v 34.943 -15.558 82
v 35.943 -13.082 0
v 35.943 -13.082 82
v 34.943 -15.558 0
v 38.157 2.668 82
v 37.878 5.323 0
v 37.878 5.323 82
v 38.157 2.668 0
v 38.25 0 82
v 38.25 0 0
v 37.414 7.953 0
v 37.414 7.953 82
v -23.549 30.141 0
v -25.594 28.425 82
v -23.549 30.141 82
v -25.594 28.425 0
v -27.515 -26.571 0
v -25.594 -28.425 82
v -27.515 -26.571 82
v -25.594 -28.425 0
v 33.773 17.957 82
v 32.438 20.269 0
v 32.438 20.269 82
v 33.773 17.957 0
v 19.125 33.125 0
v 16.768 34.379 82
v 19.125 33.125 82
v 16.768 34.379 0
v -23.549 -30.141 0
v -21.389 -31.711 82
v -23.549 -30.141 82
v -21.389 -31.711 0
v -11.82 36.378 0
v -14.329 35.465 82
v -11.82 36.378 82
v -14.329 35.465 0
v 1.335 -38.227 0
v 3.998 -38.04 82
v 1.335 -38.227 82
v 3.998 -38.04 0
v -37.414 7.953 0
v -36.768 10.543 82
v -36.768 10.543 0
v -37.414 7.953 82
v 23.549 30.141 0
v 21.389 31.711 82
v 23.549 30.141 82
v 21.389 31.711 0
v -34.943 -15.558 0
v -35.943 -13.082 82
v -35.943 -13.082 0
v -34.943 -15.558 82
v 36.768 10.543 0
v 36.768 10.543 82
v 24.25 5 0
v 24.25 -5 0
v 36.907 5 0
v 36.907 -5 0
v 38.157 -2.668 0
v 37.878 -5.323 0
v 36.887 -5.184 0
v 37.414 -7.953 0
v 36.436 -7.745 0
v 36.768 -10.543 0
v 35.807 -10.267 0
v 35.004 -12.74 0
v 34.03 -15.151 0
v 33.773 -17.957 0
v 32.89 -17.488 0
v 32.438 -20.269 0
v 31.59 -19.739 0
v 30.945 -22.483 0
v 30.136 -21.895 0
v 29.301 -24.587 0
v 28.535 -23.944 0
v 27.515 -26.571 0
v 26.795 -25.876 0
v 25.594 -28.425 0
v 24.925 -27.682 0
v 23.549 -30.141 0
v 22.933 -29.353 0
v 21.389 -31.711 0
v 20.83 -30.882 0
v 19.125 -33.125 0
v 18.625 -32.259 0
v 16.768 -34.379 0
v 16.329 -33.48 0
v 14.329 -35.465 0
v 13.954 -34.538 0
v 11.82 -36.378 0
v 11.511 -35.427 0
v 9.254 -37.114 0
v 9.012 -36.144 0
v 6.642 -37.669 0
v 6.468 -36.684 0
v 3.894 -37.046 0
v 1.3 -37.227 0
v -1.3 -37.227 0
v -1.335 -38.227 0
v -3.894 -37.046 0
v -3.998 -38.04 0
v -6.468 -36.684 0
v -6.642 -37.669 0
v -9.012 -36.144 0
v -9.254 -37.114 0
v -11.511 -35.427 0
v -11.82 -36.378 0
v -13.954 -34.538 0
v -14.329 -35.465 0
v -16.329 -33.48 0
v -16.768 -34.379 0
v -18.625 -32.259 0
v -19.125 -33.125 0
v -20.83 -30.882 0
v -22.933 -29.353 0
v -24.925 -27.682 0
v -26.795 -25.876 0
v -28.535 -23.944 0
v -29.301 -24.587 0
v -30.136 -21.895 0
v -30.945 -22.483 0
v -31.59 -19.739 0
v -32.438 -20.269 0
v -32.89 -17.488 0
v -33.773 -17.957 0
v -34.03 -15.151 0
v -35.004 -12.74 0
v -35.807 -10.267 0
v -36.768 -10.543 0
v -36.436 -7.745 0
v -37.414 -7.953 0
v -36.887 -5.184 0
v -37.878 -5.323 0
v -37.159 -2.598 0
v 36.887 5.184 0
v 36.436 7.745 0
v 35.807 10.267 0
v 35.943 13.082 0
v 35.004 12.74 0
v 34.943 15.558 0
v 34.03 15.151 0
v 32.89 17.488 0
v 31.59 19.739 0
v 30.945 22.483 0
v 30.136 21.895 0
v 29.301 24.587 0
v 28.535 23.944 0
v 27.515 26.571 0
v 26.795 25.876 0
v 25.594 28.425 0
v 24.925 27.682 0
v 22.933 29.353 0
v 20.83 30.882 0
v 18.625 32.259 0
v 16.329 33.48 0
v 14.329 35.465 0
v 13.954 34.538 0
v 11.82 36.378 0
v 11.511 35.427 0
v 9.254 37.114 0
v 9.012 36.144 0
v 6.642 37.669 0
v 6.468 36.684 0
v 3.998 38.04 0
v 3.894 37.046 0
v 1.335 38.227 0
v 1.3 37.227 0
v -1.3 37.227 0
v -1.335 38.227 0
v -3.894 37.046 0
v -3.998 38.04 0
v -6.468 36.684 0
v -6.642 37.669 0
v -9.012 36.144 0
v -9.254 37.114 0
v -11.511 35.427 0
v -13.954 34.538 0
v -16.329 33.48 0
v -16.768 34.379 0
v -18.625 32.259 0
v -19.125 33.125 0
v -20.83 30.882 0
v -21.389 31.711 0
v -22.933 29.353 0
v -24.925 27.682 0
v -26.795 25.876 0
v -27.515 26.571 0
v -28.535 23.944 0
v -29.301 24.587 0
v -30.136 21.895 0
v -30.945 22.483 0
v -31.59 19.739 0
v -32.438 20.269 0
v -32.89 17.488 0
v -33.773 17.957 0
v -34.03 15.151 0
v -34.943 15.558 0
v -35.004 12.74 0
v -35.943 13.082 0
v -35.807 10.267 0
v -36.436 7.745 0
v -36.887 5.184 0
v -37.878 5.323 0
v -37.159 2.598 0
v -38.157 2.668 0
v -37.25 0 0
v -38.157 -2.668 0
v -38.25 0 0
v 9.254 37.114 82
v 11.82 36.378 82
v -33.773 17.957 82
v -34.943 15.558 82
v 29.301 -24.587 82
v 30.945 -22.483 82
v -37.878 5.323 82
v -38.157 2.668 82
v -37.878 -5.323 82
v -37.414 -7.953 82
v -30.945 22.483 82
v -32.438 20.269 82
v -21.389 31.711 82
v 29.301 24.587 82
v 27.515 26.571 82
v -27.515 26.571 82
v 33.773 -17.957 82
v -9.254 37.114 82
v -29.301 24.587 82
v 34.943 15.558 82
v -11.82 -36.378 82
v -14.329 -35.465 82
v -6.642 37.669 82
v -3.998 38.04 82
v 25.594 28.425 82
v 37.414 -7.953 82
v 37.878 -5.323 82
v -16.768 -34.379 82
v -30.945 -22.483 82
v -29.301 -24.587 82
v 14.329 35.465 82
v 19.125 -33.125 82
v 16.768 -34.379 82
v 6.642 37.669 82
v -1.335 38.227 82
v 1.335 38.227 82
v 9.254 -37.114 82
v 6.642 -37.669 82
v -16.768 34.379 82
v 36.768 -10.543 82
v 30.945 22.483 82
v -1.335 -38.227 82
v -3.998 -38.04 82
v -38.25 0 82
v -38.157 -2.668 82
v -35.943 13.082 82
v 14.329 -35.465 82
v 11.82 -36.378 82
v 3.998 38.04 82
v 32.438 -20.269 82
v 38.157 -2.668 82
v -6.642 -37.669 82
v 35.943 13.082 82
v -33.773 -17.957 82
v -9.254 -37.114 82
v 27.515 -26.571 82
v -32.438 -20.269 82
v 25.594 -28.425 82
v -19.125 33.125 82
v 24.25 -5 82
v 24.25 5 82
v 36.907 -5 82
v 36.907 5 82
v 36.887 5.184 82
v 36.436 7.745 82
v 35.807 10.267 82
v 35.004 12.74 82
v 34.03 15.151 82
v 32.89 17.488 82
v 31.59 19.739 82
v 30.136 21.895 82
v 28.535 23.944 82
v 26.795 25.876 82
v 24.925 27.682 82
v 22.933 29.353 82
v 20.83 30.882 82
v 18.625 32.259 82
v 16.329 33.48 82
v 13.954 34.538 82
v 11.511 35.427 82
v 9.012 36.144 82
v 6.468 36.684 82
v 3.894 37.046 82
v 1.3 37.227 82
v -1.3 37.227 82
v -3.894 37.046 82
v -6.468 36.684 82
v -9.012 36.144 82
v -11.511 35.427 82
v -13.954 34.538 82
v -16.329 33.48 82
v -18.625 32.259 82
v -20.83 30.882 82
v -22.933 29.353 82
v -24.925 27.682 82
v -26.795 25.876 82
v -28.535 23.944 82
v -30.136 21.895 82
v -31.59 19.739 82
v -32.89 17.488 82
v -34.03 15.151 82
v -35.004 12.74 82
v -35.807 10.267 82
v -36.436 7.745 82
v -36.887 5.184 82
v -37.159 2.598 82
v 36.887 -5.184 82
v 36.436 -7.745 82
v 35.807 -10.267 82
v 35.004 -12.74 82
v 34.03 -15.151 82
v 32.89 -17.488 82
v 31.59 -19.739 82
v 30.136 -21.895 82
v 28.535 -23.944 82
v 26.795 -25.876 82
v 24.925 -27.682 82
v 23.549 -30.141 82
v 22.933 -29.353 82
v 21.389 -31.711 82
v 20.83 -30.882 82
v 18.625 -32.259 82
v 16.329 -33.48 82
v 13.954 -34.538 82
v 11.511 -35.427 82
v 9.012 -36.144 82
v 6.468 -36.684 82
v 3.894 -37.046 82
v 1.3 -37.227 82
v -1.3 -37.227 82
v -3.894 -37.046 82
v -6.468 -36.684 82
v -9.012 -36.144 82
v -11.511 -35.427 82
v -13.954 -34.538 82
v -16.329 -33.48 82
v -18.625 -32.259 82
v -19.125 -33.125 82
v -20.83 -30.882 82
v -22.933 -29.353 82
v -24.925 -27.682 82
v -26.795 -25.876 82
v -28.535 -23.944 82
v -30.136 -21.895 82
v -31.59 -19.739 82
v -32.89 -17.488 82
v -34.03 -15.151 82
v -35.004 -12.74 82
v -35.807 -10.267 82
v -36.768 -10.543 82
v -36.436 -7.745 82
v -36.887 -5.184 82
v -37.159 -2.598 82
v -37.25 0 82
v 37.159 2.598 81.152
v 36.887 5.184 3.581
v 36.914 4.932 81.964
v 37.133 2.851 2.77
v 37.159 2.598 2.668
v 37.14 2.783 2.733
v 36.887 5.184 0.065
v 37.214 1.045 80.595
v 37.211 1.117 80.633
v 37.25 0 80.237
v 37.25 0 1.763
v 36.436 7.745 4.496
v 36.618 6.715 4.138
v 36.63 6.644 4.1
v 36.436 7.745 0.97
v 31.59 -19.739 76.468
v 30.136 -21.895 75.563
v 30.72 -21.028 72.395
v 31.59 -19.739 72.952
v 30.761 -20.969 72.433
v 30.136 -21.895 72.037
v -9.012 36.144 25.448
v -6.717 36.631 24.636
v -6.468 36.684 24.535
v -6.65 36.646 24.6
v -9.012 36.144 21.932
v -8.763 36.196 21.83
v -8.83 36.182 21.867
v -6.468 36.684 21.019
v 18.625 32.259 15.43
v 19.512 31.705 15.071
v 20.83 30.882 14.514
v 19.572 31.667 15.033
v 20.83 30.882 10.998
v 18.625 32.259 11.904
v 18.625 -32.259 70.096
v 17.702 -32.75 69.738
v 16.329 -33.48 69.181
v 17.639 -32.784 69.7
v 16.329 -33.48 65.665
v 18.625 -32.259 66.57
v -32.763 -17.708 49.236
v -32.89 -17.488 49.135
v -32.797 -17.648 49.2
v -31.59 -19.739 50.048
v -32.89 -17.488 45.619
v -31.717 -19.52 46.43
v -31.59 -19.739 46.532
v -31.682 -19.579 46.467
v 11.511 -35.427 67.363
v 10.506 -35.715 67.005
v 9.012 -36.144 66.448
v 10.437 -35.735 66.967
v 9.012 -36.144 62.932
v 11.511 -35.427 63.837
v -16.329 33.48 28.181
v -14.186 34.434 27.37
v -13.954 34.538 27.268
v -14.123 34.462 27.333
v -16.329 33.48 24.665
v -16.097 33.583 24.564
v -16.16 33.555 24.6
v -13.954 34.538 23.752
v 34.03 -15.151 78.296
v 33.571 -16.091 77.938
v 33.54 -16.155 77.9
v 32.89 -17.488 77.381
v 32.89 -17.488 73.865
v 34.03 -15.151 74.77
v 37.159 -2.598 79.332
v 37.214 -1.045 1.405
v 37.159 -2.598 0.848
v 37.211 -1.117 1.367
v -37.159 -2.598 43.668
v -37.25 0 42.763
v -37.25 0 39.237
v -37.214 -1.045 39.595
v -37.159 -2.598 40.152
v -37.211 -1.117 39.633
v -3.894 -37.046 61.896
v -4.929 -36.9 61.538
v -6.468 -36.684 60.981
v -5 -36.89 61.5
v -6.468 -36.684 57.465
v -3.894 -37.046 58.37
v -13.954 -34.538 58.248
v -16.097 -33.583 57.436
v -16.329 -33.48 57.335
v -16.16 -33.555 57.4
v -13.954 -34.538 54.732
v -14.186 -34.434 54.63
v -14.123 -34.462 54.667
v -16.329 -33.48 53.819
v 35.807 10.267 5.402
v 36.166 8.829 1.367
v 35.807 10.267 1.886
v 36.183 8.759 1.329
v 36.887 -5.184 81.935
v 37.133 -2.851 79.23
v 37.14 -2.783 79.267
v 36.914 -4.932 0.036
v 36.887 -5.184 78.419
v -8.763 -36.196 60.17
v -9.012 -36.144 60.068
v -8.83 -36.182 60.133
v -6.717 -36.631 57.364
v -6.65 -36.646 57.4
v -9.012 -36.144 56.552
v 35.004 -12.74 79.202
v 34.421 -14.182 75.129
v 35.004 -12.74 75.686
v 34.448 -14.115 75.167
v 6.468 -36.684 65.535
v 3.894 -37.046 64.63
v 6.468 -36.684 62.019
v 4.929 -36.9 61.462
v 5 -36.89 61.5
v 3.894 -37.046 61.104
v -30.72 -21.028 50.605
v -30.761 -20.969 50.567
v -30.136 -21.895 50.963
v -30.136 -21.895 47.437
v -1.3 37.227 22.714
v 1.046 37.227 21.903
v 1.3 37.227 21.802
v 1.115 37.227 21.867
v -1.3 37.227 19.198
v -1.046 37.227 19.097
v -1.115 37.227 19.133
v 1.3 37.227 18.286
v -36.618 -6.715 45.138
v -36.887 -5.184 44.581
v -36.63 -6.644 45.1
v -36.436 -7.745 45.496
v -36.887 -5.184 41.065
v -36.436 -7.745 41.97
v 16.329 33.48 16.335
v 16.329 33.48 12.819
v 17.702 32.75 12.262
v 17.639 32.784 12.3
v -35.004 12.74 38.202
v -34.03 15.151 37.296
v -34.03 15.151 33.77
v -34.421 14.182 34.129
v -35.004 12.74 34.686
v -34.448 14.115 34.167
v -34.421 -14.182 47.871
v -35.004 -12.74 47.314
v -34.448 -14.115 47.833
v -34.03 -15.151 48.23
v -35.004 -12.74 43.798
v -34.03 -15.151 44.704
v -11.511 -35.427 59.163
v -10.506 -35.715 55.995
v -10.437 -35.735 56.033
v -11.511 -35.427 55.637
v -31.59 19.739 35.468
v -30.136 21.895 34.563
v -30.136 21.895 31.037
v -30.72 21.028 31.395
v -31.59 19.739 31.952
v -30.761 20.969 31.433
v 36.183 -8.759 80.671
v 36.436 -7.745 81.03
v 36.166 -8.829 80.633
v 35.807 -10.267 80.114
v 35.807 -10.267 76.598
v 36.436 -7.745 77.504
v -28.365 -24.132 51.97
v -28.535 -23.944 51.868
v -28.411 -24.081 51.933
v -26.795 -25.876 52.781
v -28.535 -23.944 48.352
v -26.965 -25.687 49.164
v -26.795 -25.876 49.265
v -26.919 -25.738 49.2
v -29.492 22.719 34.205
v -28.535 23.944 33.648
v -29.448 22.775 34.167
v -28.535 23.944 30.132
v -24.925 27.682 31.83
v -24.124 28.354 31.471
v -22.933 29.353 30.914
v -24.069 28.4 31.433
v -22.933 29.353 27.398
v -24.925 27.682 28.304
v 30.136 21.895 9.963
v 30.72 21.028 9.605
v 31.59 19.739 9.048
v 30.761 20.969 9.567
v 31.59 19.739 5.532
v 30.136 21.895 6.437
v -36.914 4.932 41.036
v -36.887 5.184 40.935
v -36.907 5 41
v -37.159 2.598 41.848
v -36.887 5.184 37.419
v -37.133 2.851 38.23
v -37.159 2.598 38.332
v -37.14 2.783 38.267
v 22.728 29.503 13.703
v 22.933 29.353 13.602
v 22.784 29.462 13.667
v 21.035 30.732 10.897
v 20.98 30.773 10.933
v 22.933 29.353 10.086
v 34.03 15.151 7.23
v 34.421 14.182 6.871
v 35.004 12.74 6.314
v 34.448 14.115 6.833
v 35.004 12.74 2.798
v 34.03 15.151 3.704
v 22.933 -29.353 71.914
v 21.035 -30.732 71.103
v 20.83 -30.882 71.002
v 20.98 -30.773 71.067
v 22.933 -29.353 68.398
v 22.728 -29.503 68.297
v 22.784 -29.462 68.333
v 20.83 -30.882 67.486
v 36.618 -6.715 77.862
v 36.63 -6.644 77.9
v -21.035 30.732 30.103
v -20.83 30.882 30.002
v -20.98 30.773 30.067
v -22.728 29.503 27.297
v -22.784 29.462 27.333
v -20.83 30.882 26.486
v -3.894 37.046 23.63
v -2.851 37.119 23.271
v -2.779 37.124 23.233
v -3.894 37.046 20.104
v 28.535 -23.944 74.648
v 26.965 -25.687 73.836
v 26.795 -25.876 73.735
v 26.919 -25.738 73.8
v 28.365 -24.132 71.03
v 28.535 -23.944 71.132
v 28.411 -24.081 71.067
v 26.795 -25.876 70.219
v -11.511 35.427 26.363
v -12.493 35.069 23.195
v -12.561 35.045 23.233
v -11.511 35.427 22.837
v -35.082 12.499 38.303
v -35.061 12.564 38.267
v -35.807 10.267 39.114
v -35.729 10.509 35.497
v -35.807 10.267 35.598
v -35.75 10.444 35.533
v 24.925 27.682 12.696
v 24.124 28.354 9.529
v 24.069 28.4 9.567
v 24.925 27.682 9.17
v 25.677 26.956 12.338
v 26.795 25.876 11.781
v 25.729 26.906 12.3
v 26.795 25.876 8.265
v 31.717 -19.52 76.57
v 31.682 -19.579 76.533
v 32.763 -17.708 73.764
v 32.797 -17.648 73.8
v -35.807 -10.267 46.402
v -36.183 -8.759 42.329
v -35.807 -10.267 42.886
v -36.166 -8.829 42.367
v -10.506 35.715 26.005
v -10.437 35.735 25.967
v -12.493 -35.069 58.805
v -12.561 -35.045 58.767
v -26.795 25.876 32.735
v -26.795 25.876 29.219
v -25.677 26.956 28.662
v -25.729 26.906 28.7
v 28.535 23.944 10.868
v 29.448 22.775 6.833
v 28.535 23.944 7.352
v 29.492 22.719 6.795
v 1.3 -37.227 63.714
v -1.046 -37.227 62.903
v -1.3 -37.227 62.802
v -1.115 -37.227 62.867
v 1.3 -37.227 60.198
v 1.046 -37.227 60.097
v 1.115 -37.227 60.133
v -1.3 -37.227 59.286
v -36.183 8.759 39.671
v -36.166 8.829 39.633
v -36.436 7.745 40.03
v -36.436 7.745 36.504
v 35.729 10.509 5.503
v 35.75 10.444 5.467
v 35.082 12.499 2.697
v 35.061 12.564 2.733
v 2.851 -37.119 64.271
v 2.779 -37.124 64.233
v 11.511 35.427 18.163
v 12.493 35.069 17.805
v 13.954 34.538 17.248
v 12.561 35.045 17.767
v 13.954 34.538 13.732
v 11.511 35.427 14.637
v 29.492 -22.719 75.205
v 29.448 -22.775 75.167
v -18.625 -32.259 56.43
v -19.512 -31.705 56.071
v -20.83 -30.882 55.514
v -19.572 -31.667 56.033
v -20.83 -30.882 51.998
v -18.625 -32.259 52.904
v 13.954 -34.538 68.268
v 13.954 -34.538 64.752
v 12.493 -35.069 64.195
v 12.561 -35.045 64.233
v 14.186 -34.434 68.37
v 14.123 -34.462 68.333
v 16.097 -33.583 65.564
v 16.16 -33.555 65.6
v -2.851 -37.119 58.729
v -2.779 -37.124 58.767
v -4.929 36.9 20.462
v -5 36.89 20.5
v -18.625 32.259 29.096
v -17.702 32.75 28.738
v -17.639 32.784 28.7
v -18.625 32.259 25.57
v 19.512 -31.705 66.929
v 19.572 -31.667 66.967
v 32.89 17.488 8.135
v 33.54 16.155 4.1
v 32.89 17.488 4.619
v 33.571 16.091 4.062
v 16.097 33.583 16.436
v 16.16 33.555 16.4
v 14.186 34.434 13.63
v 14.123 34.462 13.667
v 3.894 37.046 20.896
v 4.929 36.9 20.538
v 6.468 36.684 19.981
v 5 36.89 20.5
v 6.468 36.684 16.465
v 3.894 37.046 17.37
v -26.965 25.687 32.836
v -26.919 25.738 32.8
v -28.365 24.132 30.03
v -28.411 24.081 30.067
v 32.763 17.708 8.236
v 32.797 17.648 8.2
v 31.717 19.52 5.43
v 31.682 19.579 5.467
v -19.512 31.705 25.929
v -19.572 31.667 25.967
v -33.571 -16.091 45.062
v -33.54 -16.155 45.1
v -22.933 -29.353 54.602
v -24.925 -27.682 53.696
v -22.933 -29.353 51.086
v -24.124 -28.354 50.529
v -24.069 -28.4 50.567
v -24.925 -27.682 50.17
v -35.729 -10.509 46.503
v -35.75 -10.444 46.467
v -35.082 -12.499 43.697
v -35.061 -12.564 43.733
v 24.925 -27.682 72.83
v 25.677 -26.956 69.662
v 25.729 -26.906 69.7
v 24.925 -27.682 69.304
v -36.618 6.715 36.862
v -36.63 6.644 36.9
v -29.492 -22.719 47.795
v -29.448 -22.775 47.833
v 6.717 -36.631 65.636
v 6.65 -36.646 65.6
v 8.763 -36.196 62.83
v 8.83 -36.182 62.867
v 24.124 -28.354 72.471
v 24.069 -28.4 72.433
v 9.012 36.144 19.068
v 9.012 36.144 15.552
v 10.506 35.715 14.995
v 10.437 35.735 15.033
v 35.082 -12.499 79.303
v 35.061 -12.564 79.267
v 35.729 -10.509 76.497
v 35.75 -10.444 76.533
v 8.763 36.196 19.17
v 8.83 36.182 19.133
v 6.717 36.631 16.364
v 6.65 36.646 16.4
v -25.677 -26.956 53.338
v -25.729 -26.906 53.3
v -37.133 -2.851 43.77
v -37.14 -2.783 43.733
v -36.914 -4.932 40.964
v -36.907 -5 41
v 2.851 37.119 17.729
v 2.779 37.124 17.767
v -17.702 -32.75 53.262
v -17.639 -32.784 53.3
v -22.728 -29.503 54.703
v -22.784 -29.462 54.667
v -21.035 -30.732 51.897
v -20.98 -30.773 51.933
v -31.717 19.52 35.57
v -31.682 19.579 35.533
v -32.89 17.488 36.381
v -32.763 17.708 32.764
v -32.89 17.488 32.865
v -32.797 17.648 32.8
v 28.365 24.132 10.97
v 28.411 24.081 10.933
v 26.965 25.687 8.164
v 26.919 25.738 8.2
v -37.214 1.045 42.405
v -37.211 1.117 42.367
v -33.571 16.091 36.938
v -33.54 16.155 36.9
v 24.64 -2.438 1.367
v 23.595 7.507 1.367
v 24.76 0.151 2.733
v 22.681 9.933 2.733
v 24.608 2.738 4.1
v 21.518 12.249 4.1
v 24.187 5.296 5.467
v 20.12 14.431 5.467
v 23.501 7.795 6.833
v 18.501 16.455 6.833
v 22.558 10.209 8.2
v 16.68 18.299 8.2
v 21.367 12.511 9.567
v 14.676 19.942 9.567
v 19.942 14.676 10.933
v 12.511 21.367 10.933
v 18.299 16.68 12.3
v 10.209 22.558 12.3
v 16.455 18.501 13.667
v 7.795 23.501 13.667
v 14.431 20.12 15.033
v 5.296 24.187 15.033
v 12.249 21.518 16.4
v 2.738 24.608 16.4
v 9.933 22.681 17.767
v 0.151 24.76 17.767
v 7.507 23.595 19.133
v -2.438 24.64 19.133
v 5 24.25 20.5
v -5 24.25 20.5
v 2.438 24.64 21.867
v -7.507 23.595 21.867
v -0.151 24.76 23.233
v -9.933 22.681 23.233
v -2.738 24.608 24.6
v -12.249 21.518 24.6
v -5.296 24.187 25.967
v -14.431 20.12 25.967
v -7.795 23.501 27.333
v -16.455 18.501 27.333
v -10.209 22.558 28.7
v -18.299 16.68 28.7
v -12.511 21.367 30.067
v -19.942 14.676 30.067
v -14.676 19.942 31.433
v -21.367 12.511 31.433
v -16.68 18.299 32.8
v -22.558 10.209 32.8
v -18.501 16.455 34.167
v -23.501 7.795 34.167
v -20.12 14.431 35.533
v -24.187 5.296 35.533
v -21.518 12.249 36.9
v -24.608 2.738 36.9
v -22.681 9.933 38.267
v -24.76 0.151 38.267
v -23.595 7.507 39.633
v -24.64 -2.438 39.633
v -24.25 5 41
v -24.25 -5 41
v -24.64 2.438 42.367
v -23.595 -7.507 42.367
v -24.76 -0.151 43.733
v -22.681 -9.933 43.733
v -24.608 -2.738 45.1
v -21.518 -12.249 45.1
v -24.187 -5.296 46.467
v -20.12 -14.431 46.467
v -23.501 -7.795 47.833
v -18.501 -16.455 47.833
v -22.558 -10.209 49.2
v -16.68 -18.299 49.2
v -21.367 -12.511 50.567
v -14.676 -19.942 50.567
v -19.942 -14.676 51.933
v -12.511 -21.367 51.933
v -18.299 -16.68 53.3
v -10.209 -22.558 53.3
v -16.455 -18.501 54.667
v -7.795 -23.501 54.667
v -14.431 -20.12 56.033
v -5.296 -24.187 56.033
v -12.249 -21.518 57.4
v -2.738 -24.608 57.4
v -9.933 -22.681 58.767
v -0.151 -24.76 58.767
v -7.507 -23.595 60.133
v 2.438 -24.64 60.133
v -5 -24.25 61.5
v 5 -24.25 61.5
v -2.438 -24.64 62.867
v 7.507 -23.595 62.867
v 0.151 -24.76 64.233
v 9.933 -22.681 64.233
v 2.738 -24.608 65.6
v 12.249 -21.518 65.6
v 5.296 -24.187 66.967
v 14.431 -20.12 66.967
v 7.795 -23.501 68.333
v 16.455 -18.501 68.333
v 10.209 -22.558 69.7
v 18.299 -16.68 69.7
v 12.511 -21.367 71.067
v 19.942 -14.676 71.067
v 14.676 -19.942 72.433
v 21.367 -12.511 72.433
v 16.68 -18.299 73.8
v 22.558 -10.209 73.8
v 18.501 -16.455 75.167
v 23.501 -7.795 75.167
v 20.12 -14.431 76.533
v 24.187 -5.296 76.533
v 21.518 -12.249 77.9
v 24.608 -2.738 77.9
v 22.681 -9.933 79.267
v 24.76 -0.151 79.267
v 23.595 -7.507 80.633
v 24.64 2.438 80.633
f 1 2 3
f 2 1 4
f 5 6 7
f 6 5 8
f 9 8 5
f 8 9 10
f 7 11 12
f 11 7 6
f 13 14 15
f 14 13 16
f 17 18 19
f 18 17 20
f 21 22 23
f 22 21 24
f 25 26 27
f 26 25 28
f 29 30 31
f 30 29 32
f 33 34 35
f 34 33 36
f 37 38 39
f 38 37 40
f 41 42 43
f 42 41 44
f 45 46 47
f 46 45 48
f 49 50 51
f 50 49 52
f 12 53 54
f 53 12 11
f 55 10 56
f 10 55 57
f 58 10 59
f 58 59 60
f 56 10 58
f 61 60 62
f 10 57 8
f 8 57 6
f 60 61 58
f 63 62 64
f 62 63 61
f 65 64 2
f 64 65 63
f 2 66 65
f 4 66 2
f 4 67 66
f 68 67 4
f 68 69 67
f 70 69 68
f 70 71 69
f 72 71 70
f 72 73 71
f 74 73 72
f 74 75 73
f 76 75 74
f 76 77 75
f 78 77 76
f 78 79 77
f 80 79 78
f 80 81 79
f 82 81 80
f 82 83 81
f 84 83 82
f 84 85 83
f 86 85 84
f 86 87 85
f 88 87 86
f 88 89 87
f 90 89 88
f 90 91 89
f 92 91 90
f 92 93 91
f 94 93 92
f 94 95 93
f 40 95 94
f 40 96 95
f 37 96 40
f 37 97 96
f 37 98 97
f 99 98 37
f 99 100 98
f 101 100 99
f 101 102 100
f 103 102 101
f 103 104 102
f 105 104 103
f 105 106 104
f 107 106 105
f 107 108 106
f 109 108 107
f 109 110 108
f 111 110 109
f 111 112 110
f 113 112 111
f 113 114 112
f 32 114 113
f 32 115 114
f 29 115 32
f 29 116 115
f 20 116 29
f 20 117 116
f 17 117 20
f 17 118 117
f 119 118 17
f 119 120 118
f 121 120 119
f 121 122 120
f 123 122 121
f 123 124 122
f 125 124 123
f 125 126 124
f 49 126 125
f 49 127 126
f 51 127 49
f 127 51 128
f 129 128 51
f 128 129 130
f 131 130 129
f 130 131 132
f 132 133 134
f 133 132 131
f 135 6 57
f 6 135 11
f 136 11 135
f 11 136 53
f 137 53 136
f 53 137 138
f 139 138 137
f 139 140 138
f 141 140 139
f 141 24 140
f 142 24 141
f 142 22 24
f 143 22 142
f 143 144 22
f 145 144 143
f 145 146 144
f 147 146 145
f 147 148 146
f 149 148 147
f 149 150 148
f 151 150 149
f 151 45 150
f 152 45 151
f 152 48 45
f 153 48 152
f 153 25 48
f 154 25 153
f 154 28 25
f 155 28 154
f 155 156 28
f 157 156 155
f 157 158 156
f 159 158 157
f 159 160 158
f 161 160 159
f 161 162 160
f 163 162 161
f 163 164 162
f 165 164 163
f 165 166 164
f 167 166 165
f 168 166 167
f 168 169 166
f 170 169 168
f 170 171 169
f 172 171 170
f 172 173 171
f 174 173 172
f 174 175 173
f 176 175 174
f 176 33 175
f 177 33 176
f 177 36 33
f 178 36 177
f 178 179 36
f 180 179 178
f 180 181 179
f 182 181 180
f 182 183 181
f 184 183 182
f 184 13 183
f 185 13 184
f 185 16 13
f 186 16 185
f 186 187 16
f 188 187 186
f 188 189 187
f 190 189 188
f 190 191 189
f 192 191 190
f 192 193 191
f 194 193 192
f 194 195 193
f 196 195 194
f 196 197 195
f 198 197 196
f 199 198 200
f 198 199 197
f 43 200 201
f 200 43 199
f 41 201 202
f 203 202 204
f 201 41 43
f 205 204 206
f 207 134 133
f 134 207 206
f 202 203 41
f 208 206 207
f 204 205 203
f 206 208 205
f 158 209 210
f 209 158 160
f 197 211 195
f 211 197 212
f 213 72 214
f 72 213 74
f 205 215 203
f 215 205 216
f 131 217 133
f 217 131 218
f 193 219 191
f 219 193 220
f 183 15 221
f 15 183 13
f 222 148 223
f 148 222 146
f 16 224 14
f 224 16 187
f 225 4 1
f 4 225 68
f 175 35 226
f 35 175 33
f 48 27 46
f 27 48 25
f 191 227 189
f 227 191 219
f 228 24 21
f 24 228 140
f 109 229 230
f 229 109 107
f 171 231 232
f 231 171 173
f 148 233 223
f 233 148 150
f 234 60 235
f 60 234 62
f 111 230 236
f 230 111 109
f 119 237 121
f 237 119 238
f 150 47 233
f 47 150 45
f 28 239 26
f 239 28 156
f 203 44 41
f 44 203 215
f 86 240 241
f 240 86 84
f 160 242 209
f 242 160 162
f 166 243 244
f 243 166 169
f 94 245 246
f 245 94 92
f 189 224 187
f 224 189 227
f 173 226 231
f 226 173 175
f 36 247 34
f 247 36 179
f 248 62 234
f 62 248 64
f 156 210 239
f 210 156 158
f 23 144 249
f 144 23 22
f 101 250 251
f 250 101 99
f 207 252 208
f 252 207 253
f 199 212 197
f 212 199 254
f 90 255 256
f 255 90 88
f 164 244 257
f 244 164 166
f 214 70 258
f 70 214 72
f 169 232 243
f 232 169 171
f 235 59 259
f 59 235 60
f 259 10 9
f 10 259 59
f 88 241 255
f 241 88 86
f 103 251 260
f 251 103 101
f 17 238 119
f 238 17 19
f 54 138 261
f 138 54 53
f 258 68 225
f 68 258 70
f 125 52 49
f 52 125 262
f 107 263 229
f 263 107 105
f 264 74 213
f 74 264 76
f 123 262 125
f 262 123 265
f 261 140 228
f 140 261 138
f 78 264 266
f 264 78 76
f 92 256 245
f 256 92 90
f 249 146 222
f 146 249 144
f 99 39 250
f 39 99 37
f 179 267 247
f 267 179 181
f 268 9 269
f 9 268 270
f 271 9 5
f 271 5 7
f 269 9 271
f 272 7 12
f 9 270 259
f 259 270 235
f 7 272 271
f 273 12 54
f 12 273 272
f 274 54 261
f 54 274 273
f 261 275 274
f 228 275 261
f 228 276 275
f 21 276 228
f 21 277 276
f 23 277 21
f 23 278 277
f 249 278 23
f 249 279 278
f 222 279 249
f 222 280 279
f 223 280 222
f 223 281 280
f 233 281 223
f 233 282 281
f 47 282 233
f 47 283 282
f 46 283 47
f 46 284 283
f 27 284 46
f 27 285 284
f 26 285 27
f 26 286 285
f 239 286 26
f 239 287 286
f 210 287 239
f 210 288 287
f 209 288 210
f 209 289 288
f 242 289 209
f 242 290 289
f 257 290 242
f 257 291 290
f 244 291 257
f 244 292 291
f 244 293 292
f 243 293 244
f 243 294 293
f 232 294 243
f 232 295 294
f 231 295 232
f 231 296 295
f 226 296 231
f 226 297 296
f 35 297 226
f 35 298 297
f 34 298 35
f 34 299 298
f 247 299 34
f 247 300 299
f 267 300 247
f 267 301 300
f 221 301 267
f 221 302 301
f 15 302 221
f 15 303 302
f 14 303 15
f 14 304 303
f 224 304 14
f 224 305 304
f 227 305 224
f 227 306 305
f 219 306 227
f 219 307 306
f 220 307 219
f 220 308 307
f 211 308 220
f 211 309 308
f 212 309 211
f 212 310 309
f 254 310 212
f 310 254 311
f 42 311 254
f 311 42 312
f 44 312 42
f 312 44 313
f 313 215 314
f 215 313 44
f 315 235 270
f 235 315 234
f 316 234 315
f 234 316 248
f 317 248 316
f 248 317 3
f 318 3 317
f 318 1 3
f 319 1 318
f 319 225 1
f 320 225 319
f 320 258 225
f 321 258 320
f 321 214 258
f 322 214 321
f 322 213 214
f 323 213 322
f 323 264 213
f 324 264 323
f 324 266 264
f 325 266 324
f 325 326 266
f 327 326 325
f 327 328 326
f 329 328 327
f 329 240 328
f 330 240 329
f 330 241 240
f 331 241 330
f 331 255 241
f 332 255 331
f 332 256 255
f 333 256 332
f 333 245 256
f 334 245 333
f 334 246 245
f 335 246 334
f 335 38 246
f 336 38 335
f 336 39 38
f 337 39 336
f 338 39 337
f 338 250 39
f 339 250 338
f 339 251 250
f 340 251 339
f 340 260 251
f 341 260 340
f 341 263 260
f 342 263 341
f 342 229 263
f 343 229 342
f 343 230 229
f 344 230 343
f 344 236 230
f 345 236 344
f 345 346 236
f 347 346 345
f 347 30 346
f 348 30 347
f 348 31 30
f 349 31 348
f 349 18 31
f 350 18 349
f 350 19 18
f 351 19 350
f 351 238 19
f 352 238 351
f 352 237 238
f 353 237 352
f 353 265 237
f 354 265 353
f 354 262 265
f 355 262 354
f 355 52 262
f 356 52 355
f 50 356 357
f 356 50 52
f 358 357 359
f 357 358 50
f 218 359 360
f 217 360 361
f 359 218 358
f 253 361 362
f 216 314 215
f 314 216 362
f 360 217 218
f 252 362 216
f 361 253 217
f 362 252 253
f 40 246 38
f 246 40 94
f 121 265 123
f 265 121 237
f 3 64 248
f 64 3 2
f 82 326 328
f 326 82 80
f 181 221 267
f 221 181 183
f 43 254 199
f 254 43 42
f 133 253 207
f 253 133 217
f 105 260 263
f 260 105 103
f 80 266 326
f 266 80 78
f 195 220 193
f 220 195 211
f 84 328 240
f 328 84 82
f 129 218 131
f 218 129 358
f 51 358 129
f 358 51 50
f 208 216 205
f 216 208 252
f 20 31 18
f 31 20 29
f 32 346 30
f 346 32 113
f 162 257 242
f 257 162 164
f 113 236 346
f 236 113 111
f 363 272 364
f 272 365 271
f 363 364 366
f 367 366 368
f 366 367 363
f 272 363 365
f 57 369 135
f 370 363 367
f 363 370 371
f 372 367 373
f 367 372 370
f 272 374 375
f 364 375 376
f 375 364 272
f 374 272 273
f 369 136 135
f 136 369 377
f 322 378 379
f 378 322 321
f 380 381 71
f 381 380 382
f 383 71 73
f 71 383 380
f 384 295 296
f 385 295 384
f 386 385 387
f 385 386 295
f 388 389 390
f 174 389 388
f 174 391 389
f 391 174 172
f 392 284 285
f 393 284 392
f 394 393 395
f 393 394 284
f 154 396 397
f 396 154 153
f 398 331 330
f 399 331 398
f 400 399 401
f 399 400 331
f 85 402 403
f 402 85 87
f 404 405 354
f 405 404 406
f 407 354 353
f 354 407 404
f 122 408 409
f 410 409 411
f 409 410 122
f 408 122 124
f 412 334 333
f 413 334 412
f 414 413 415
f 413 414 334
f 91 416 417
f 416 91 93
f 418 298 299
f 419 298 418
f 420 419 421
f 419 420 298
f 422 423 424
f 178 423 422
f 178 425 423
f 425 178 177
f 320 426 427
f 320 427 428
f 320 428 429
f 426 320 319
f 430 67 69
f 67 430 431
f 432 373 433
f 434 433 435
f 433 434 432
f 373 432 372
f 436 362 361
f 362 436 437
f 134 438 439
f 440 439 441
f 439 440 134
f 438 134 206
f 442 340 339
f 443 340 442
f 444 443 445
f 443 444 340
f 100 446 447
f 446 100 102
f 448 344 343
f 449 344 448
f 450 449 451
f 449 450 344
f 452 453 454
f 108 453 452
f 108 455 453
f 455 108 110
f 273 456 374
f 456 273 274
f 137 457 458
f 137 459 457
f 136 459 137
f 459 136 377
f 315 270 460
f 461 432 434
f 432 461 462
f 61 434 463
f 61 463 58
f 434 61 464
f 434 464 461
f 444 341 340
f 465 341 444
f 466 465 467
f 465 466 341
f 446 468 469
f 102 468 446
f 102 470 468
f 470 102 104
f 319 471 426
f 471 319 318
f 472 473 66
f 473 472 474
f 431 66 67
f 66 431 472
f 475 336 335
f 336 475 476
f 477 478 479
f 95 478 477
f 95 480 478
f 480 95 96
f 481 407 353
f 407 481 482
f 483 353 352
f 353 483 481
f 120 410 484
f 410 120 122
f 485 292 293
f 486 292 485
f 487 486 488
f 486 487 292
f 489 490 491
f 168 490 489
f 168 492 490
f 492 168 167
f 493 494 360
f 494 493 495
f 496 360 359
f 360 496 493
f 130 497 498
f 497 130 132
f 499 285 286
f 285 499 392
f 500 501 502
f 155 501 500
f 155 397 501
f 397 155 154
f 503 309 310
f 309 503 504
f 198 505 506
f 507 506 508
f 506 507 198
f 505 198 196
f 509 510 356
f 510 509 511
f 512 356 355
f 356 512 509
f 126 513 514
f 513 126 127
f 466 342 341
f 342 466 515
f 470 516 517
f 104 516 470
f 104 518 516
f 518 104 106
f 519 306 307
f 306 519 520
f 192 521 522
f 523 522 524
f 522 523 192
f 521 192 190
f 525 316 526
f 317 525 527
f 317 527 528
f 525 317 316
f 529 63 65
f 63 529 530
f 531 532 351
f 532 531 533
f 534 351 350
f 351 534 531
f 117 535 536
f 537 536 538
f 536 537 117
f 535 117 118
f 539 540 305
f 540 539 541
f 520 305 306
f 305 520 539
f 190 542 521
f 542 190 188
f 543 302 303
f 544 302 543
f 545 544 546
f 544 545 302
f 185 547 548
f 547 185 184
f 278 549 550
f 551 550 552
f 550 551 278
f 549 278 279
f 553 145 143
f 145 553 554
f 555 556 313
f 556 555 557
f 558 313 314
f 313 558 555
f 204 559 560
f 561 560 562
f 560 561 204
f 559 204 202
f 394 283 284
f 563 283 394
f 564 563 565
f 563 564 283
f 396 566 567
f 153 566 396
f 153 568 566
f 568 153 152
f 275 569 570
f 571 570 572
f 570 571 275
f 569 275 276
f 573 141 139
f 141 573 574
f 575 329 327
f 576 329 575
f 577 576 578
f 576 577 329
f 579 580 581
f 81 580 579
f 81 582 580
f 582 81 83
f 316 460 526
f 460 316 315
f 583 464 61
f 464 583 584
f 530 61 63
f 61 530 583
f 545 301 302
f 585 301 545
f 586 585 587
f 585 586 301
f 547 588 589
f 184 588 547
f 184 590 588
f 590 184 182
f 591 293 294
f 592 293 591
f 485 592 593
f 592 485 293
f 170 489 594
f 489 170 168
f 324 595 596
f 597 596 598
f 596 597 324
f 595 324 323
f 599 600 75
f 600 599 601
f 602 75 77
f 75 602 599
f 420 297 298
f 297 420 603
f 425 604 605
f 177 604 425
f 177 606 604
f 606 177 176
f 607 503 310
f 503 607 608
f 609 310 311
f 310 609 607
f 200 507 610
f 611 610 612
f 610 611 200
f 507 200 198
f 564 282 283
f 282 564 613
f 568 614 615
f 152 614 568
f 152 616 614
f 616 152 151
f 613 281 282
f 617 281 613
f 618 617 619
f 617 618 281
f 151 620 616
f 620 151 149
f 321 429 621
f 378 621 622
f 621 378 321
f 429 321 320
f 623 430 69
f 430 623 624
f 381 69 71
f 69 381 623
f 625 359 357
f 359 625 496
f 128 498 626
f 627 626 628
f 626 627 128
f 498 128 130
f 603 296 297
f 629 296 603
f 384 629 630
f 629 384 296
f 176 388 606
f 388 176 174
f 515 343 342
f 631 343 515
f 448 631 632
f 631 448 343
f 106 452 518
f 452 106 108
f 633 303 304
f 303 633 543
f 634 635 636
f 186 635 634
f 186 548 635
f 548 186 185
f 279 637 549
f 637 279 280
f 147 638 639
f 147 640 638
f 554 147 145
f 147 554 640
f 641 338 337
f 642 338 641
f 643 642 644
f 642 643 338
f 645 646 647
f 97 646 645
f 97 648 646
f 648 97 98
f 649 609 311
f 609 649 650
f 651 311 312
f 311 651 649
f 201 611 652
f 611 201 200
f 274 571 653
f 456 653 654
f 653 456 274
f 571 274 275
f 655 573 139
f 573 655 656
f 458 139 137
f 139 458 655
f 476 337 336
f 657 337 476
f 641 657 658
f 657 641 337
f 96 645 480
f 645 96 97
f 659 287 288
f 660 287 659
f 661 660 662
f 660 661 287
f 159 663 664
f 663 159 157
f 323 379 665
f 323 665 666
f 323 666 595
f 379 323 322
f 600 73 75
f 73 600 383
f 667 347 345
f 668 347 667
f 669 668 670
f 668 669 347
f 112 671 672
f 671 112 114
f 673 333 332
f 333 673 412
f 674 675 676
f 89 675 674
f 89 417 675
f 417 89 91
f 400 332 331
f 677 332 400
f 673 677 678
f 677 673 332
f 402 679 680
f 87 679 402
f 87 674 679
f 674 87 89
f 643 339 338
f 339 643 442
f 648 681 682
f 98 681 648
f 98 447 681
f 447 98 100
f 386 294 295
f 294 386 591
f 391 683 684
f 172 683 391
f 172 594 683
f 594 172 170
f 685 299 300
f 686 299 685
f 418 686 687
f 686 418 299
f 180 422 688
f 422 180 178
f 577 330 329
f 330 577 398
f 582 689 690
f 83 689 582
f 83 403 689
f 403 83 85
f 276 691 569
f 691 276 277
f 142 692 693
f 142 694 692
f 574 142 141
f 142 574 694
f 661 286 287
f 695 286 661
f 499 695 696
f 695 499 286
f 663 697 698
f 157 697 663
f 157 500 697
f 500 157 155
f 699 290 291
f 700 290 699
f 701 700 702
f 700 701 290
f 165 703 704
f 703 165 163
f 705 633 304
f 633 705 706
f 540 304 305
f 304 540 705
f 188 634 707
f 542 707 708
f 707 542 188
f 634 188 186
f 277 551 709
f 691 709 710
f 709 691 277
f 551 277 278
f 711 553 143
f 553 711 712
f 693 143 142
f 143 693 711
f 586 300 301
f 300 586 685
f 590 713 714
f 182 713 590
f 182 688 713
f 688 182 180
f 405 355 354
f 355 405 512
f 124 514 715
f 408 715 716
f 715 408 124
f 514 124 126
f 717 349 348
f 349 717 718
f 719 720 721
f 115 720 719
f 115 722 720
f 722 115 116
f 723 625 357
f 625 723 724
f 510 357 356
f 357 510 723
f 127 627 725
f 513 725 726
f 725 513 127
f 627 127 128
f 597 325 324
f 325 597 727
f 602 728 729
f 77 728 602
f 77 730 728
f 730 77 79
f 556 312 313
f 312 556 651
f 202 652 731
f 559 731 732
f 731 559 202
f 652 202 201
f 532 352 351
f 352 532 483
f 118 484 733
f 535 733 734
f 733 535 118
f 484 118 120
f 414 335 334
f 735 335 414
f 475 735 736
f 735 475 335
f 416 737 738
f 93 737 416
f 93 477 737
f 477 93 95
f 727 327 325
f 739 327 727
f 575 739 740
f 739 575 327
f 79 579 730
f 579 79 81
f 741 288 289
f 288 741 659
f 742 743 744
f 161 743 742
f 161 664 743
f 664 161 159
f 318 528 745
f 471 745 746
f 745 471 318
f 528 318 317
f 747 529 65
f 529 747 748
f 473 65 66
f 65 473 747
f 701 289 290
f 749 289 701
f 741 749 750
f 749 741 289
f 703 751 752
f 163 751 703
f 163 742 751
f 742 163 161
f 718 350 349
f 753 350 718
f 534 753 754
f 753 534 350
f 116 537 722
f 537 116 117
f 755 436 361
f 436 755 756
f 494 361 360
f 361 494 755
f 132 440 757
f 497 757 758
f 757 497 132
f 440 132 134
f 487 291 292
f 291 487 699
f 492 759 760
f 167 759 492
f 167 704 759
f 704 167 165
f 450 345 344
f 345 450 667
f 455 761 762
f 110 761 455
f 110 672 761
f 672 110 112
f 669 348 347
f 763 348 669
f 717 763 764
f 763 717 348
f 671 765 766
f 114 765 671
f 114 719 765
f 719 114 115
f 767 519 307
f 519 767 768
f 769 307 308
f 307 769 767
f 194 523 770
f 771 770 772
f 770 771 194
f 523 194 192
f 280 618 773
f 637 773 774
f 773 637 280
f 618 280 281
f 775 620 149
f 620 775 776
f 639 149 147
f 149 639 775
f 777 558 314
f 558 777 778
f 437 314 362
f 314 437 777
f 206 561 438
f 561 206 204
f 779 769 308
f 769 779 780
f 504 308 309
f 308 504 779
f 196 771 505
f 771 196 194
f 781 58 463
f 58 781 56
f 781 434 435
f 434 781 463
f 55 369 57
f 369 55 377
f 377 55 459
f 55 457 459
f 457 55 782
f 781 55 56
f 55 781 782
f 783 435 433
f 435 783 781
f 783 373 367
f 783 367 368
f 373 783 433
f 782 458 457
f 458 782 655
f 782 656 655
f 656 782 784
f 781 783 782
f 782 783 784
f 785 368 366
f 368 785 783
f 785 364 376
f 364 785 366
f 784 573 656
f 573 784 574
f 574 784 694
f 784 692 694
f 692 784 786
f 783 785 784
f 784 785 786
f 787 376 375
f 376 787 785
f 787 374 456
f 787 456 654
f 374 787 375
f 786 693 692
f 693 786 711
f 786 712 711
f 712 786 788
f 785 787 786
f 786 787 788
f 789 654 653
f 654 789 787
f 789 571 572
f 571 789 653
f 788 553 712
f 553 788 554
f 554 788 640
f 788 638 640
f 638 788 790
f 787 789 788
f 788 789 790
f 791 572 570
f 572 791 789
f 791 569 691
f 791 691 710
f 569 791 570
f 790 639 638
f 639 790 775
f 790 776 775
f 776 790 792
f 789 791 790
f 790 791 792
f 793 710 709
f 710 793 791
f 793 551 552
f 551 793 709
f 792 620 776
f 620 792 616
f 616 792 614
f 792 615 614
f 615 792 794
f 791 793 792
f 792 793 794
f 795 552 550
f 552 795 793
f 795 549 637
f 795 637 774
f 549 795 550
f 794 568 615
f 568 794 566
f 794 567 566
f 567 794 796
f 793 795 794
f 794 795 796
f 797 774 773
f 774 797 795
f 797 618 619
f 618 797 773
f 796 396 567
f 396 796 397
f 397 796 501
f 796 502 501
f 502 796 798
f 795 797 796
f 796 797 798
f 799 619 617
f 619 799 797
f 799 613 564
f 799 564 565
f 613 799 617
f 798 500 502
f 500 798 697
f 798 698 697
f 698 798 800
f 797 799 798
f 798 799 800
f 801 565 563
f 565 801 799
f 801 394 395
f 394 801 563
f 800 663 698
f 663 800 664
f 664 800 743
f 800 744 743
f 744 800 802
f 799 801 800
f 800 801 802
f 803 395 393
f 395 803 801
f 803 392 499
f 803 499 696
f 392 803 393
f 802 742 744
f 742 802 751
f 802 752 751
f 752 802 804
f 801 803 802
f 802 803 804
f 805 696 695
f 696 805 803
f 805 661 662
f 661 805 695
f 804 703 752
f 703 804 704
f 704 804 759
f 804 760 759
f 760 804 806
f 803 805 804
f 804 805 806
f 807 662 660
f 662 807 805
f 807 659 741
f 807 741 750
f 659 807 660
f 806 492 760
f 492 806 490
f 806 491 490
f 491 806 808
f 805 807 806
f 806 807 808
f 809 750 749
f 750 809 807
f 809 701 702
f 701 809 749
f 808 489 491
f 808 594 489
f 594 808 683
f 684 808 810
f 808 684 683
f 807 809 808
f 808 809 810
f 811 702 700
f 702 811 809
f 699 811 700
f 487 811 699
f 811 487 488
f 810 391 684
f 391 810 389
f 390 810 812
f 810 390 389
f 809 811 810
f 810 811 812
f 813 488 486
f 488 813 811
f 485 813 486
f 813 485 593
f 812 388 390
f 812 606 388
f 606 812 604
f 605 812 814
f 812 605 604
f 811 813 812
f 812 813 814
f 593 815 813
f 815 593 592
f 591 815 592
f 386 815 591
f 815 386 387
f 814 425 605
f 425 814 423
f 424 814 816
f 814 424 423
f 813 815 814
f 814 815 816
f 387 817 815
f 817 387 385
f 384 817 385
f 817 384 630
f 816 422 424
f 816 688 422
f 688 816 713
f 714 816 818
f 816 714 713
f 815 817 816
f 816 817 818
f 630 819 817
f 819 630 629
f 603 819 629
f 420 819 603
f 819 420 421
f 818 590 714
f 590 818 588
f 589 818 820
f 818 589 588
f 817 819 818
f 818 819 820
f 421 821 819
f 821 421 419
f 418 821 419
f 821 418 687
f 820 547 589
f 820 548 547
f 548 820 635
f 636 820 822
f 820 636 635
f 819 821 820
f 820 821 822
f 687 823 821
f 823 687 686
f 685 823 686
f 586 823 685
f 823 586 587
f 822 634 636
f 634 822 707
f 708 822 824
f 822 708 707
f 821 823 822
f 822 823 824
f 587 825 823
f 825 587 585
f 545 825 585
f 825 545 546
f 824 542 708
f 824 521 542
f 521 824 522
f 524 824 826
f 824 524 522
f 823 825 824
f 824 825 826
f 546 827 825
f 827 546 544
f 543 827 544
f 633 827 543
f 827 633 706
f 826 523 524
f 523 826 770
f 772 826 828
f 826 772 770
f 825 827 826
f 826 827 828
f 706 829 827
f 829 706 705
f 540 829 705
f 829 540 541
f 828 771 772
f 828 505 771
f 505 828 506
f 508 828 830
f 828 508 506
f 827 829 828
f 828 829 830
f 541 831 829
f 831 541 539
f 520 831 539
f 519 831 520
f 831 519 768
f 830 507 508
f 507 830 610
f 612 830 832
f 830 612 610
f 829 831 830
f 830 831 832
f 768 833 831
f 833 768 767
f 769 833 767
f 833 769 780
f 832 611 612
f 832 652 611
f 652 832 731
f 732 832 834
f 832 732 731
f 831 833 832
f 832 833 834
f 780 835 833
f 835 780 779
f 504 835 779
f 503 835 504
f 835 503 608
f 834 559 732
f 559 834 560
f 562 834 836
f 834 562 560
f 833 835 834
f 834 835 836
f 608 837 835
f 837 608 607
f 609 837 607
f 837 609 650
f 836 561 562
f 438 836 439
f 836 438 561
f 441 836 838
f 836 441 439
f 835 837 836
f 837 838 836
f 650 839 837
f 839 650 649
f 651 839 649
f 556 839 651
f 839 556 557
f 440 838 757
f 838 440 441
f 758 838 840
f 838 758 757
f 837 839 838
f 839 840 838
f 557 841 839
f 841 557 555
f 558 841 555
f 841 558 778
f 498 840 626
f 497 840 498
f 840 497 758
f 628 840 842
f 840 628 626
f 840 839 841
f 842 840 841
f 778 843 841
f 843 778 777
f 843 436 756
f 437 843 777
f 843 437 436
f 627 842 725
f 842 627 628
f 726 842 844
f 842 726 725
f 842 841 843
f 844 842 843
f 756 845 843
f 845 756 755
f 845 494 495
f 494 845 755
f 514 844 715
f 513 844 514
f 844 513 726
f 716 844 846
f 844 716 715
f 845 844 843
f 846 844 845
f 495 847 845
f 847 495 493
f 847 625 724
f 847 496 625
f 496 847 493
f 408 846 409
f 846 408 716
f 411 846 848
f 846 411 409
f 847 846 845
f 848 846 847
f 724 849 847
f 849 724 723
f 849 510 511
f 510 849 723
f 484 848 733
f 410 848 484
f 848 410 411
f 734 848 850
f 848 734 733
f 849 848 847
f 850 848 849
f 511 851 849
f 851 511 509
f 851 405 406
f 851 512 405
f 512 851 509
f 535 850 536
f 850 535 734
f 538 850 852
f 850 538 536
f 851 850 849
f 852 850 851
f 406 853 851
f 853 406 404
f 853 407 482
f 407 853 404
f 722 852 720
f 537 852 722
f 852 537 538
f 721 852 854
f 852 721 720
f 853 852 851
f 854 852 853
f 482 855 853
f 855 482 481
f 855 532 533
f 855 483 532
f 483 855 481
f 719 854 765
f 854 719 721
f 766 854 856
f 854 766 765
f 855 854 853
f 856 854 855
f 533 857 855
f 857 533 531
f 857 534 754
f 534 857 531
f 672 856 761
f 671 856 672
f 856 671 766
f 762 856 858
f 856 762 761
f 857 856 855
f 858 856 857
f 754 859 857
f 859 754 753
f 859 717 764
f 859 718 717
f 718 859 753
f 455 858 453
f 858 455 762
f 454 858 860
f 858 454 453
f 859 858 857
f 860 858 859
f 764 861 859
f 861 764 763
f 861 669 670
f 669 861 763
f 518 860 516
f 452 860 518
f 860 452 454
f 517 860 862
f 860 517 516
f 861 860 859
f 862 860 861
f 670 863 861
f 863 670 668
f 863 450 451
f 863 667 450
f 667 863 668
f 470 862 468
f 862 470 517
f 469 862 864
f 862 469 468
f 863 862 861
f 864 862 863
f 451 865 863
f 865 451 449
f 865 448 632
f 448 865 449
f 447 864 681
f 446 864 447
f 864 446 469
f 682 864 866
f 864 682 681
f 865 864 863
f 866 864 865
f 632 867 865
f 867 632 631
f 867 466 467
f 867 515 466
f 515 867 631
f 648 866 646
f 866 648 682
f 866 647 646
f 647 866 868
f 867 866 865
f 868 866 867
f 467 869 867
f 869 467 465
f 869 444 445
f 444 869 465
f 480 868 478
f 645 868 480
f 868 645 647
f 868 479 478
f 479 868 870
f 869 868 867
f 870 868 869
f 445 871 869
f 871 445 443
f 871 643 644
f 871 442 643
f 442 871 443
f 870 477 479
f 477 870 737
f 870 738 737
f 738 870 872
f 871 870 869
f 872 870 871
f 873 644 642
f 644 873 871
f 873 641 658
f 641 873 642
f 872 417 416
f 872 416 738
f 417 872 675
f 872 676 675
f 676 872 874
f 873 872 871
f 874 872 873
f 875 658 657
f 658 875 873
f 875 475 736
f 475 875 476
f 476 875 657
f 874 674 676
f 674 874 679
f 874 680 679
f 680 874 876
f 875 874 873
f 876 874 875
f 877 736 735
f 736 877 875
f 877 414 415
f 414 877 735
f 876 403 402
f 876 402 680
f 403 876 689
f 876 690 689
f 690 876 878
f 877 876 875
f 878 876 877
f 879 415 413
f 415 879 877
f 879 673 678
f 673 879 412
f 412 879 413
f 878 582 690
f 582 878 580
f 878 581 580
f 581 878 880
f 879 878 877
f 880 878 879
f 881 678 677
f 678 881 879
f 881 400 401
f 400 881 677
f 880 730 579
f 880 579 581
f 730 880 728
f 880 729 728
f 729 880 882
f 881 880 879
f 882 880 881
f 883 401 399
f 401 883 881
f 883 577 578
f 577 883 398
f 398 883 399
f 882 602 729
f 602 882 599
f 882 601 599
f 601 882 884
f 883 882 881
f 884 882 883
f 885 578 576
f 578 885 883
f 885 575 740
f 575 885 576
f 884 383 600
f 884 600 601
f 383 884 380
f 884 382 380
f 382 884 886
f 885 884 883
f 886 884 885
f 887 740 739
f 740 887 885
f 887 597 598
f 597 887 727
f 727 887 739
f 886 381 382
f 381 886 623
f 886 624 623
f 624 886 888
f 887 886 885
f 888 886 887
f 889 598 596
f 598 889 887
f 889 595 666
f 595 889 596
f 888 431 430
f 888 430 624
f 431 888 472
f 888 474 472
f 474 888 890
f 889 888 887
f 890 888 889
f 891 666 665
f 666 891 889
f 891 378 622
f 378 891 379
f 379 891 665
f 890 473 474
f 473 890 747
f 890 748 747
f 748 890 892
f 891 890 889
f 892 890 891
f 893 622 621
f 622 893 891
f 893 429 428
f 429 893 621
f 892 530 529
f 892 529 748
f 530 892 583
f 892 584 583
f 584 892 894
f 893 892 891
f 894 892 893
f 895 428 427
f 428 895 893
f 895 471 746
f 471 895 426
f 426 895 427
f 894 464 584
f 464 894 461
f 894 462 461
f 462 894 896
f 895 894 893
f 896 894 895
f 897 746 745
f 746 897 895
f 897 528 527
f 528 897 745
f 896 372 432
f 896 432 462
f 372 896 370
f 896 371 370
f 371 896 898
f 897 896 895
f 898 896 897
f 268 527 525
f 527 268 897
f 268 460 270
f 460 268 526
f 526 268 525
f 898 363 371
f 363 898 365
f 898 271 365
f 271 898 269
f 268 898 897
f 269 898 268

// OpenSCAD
// file: gu-11-headers.scad
pod_r_outer = 			89.33 /2;
pod_r_wall_inner = 		76.5 /2;
pod_wall_thickness =		pod_r_outer - pod_r_wall_inner;

ammo_d	 =			13 ;
ammo_r	 =			ammo_d / 2 ;
ammo_length = 			72;
ammo_chamber_inner_r =		pod_r_wall_inner - (2 * ammo_r ) ; 


muzzle_r_first_step =		pod_r_outer - 15 ;// WAS 44.66 /2 ;
muzzle_r_final_step =		35.72 /2 ;
muzzle_h_first_to_final =	48.34 ;

muzzle_r_inner =		pod_r_wall_inner -  15 ;  
		//  WAS	muzzle_r_final_step - pod_wall_thickness ;
muzzle_r_insert =		pod_r_wall_inner;
muzzle_h_insert =		20;

pvc_05in_diameter_outer=	21.35;
pvc_05in_600psi_diameter_inner=	15.35;
pvc_05in_315psi_diameter_inner=	18.24;
pvc_05in_hamper_diameter_inner=	18.5;

pvc_05in_r_outer=		pvc_05in_diameter_outer / 2 ;
pvc_05in_315psi_r_inner=	pvc_05in_315psi_diameter_inner / 2;
pvc_05in_600psi_r_inner=	pvc_05in_600psi_diameter_inner / 2;
pvc_05in_hamper_r_inner=	pvc_05in_hamper_diameter_inner / 2;

pvc_05in_offset=		sqrt(3*pvc_05in_r_outer*pvc_05in_r_outer);

// zero pane
module zero_pane() {
	color("lightblue")  cube([100,100,0.1], center=true);
}

echo("Loaded header definitions from <gu-11-headers.scad>...");
echo ();
// main file
include<gu-11-headers.scad>;

FN=30;
FN_pod=90;

echo(" *** This block ECHOs values from gu-11-headers.scad *** ");
echo("pod_r_outer ", pod_r_outer);
echo("pod_r_wall_inner ", pod_r_wall_inner);
echo("pod_wall_thickness ", pod_wall_thickness);
echo("muzzle_r_inner ", muzzle_r_inner);
echo("muzzle_r_insert ",muzzle_r_insert);
echo("muzzle_h_insert ",muzzle_h_insert);
echo("muzzle_r_first_step ", muzzle_r_first_step);
echo("muzzle_r_final_step ", muzzle_r_final_step);
echo("muzzle_h_first_to_final ", muzzle_h_first_to_final);
echo("ammo_d ", ammo_d	 );
echo("ammo_r ", ammo_r	);
echo("ammo_length ", ammo_length);
echo("ammo_chamber_inner_r ", ammo_chamber_inner_r);
echo("pvc_05in_diameter_outer ", pvc_05in_diameter_outer);
echo("pvc_05in_600psi_diameter_inner ", pvc_05in_600psi_diameter_inner);
echo("pvc_05in_315psi_diameter_inner ", pvc_05in_315psi_diameter_inner);
echo("pvc_05in_hamper_diameter_inner ", pvc_05in_hamper_diameter_inner);
echo("pvc_05in_r_outer ", pvc_05in_r_outer);
echo("pvc_05in_315psi_r_inner ", pvc_05in_315psi_r_inner);
echo("pvc_05in_600psi_r_inner ", pvc_05in_600psi_r_inner);
echo("pvc_05in_hamper_r_inner ", pvc_05in_hamper_r_inner);
echo("pvc_05in_offset ", pvc_05in_offset);

ammo_chamber_half_inner_r =	(pod_r_wall_inner-ammo_chamber_inner_r)/2 + ammo_chamber_inner_r ;
ammo_feeder_cut_r = ammo_chamber_inner_r + ammo_d * 1;  // WAS *3/4
		// WAS ammo_chamber_half_inner_r + 1;
ammo_feeder_circle_position_r = ammo_chamber_inner_r + ammo_d * 1/4 ;
		// WAS ammo_chamber_half_inner_r - 1 ;
ammo_offset = 	sqrt(3*ammo_feeder_circle_position_r*ammo_feeder_circle_position_r);

ammo_slot_r = pvc_05in_315psi_r_inner ;
ammo_slot_r = pvc_05in_r_outer;

thread_depth = ammo_d ;
thread_width = 10 ;

echo(" *** This block of ECHOs from ammo_feeder-05in_pvc.scad ***");
echo("ammo_chamber_half_inner_r= ", ammo_chamber_half_inner_r);
echo("ammo_feeder_cut_r ", ammo_feeder_cut_r);
echo("ammo_feeder_circle_position_r ", ammo_feeder_circle_position_r);
echo("ammo_offset = ", ammo_offset );
echo("thread_depth ", thread_depth);
echo("thread_width ", thread_width);

echo("sqrt 3 * r = " , sqrt(3) * ammo_feeder_circle_position_r, "(should match above)");

echo("ammo_slot_r ", ammo_slot_r);


// Zero Pane
* zero_pane();


// Center pin
*color("red")	cylinder(r=1, h= 2* muzzle_h_insert);


//  This test piece shows full inner diameter of pod
*		translate([0,0,muzzle_h_insert/2])
			cylinder(r=pod_r_wall_inner, //muzzle_r_first_step, 
					h=muzzle_h_insert,
					center=true, $fn=FN_pod);

//	This prints a rough dart
*color("orange")
	translate([pod_r_wall_inner-ammo_r -1,0,5])
		cylinder(r=ammo_r,h=ammo_length);

//projection(cut=false)	//  MAKE IT Flat!
{	//  MAKE IT Flat!

	difference(){
		union(){
			color("blue")
			//	linear_extrude(height = fanwidth, center = true, convexity = 10, twist = -fanrot, slices = 20, scale = 1.0) {...}
				linear_extrude(height = ammo_length +10 , twist = -360, slices = 60) {
					translate([pod_r_wall_inner-thread_depth/2 - 1,0,0])
			      square([thread_depth,thread_width], center = true);	
				}

			color("green")
				difference(){
					cylinder(r=pod_r_wall_inner, h=ammo_length +10, $fn=FN_pod );
					translate([0,0,-1])
					cylinder(r=pod_r_wall_inner-1, h=ammo_length +10 +2 , $fn= FN_pod);
				}  //End difference
		// End union

		*		translate([0,0,muzzle_h_insert/2])
					cylinder(r=ammo_chamber_half_inner_r,
								h=muzzle_h_insert,
								center=true, $fn=FN_pod);
		}  // End union 

		union() color("red") {
%			translate([0,0,muzzle_h_insert/2])
				cube([100,100,100], center = true);
			

		}	// End union of differences
}	// End difference

} //end projection
